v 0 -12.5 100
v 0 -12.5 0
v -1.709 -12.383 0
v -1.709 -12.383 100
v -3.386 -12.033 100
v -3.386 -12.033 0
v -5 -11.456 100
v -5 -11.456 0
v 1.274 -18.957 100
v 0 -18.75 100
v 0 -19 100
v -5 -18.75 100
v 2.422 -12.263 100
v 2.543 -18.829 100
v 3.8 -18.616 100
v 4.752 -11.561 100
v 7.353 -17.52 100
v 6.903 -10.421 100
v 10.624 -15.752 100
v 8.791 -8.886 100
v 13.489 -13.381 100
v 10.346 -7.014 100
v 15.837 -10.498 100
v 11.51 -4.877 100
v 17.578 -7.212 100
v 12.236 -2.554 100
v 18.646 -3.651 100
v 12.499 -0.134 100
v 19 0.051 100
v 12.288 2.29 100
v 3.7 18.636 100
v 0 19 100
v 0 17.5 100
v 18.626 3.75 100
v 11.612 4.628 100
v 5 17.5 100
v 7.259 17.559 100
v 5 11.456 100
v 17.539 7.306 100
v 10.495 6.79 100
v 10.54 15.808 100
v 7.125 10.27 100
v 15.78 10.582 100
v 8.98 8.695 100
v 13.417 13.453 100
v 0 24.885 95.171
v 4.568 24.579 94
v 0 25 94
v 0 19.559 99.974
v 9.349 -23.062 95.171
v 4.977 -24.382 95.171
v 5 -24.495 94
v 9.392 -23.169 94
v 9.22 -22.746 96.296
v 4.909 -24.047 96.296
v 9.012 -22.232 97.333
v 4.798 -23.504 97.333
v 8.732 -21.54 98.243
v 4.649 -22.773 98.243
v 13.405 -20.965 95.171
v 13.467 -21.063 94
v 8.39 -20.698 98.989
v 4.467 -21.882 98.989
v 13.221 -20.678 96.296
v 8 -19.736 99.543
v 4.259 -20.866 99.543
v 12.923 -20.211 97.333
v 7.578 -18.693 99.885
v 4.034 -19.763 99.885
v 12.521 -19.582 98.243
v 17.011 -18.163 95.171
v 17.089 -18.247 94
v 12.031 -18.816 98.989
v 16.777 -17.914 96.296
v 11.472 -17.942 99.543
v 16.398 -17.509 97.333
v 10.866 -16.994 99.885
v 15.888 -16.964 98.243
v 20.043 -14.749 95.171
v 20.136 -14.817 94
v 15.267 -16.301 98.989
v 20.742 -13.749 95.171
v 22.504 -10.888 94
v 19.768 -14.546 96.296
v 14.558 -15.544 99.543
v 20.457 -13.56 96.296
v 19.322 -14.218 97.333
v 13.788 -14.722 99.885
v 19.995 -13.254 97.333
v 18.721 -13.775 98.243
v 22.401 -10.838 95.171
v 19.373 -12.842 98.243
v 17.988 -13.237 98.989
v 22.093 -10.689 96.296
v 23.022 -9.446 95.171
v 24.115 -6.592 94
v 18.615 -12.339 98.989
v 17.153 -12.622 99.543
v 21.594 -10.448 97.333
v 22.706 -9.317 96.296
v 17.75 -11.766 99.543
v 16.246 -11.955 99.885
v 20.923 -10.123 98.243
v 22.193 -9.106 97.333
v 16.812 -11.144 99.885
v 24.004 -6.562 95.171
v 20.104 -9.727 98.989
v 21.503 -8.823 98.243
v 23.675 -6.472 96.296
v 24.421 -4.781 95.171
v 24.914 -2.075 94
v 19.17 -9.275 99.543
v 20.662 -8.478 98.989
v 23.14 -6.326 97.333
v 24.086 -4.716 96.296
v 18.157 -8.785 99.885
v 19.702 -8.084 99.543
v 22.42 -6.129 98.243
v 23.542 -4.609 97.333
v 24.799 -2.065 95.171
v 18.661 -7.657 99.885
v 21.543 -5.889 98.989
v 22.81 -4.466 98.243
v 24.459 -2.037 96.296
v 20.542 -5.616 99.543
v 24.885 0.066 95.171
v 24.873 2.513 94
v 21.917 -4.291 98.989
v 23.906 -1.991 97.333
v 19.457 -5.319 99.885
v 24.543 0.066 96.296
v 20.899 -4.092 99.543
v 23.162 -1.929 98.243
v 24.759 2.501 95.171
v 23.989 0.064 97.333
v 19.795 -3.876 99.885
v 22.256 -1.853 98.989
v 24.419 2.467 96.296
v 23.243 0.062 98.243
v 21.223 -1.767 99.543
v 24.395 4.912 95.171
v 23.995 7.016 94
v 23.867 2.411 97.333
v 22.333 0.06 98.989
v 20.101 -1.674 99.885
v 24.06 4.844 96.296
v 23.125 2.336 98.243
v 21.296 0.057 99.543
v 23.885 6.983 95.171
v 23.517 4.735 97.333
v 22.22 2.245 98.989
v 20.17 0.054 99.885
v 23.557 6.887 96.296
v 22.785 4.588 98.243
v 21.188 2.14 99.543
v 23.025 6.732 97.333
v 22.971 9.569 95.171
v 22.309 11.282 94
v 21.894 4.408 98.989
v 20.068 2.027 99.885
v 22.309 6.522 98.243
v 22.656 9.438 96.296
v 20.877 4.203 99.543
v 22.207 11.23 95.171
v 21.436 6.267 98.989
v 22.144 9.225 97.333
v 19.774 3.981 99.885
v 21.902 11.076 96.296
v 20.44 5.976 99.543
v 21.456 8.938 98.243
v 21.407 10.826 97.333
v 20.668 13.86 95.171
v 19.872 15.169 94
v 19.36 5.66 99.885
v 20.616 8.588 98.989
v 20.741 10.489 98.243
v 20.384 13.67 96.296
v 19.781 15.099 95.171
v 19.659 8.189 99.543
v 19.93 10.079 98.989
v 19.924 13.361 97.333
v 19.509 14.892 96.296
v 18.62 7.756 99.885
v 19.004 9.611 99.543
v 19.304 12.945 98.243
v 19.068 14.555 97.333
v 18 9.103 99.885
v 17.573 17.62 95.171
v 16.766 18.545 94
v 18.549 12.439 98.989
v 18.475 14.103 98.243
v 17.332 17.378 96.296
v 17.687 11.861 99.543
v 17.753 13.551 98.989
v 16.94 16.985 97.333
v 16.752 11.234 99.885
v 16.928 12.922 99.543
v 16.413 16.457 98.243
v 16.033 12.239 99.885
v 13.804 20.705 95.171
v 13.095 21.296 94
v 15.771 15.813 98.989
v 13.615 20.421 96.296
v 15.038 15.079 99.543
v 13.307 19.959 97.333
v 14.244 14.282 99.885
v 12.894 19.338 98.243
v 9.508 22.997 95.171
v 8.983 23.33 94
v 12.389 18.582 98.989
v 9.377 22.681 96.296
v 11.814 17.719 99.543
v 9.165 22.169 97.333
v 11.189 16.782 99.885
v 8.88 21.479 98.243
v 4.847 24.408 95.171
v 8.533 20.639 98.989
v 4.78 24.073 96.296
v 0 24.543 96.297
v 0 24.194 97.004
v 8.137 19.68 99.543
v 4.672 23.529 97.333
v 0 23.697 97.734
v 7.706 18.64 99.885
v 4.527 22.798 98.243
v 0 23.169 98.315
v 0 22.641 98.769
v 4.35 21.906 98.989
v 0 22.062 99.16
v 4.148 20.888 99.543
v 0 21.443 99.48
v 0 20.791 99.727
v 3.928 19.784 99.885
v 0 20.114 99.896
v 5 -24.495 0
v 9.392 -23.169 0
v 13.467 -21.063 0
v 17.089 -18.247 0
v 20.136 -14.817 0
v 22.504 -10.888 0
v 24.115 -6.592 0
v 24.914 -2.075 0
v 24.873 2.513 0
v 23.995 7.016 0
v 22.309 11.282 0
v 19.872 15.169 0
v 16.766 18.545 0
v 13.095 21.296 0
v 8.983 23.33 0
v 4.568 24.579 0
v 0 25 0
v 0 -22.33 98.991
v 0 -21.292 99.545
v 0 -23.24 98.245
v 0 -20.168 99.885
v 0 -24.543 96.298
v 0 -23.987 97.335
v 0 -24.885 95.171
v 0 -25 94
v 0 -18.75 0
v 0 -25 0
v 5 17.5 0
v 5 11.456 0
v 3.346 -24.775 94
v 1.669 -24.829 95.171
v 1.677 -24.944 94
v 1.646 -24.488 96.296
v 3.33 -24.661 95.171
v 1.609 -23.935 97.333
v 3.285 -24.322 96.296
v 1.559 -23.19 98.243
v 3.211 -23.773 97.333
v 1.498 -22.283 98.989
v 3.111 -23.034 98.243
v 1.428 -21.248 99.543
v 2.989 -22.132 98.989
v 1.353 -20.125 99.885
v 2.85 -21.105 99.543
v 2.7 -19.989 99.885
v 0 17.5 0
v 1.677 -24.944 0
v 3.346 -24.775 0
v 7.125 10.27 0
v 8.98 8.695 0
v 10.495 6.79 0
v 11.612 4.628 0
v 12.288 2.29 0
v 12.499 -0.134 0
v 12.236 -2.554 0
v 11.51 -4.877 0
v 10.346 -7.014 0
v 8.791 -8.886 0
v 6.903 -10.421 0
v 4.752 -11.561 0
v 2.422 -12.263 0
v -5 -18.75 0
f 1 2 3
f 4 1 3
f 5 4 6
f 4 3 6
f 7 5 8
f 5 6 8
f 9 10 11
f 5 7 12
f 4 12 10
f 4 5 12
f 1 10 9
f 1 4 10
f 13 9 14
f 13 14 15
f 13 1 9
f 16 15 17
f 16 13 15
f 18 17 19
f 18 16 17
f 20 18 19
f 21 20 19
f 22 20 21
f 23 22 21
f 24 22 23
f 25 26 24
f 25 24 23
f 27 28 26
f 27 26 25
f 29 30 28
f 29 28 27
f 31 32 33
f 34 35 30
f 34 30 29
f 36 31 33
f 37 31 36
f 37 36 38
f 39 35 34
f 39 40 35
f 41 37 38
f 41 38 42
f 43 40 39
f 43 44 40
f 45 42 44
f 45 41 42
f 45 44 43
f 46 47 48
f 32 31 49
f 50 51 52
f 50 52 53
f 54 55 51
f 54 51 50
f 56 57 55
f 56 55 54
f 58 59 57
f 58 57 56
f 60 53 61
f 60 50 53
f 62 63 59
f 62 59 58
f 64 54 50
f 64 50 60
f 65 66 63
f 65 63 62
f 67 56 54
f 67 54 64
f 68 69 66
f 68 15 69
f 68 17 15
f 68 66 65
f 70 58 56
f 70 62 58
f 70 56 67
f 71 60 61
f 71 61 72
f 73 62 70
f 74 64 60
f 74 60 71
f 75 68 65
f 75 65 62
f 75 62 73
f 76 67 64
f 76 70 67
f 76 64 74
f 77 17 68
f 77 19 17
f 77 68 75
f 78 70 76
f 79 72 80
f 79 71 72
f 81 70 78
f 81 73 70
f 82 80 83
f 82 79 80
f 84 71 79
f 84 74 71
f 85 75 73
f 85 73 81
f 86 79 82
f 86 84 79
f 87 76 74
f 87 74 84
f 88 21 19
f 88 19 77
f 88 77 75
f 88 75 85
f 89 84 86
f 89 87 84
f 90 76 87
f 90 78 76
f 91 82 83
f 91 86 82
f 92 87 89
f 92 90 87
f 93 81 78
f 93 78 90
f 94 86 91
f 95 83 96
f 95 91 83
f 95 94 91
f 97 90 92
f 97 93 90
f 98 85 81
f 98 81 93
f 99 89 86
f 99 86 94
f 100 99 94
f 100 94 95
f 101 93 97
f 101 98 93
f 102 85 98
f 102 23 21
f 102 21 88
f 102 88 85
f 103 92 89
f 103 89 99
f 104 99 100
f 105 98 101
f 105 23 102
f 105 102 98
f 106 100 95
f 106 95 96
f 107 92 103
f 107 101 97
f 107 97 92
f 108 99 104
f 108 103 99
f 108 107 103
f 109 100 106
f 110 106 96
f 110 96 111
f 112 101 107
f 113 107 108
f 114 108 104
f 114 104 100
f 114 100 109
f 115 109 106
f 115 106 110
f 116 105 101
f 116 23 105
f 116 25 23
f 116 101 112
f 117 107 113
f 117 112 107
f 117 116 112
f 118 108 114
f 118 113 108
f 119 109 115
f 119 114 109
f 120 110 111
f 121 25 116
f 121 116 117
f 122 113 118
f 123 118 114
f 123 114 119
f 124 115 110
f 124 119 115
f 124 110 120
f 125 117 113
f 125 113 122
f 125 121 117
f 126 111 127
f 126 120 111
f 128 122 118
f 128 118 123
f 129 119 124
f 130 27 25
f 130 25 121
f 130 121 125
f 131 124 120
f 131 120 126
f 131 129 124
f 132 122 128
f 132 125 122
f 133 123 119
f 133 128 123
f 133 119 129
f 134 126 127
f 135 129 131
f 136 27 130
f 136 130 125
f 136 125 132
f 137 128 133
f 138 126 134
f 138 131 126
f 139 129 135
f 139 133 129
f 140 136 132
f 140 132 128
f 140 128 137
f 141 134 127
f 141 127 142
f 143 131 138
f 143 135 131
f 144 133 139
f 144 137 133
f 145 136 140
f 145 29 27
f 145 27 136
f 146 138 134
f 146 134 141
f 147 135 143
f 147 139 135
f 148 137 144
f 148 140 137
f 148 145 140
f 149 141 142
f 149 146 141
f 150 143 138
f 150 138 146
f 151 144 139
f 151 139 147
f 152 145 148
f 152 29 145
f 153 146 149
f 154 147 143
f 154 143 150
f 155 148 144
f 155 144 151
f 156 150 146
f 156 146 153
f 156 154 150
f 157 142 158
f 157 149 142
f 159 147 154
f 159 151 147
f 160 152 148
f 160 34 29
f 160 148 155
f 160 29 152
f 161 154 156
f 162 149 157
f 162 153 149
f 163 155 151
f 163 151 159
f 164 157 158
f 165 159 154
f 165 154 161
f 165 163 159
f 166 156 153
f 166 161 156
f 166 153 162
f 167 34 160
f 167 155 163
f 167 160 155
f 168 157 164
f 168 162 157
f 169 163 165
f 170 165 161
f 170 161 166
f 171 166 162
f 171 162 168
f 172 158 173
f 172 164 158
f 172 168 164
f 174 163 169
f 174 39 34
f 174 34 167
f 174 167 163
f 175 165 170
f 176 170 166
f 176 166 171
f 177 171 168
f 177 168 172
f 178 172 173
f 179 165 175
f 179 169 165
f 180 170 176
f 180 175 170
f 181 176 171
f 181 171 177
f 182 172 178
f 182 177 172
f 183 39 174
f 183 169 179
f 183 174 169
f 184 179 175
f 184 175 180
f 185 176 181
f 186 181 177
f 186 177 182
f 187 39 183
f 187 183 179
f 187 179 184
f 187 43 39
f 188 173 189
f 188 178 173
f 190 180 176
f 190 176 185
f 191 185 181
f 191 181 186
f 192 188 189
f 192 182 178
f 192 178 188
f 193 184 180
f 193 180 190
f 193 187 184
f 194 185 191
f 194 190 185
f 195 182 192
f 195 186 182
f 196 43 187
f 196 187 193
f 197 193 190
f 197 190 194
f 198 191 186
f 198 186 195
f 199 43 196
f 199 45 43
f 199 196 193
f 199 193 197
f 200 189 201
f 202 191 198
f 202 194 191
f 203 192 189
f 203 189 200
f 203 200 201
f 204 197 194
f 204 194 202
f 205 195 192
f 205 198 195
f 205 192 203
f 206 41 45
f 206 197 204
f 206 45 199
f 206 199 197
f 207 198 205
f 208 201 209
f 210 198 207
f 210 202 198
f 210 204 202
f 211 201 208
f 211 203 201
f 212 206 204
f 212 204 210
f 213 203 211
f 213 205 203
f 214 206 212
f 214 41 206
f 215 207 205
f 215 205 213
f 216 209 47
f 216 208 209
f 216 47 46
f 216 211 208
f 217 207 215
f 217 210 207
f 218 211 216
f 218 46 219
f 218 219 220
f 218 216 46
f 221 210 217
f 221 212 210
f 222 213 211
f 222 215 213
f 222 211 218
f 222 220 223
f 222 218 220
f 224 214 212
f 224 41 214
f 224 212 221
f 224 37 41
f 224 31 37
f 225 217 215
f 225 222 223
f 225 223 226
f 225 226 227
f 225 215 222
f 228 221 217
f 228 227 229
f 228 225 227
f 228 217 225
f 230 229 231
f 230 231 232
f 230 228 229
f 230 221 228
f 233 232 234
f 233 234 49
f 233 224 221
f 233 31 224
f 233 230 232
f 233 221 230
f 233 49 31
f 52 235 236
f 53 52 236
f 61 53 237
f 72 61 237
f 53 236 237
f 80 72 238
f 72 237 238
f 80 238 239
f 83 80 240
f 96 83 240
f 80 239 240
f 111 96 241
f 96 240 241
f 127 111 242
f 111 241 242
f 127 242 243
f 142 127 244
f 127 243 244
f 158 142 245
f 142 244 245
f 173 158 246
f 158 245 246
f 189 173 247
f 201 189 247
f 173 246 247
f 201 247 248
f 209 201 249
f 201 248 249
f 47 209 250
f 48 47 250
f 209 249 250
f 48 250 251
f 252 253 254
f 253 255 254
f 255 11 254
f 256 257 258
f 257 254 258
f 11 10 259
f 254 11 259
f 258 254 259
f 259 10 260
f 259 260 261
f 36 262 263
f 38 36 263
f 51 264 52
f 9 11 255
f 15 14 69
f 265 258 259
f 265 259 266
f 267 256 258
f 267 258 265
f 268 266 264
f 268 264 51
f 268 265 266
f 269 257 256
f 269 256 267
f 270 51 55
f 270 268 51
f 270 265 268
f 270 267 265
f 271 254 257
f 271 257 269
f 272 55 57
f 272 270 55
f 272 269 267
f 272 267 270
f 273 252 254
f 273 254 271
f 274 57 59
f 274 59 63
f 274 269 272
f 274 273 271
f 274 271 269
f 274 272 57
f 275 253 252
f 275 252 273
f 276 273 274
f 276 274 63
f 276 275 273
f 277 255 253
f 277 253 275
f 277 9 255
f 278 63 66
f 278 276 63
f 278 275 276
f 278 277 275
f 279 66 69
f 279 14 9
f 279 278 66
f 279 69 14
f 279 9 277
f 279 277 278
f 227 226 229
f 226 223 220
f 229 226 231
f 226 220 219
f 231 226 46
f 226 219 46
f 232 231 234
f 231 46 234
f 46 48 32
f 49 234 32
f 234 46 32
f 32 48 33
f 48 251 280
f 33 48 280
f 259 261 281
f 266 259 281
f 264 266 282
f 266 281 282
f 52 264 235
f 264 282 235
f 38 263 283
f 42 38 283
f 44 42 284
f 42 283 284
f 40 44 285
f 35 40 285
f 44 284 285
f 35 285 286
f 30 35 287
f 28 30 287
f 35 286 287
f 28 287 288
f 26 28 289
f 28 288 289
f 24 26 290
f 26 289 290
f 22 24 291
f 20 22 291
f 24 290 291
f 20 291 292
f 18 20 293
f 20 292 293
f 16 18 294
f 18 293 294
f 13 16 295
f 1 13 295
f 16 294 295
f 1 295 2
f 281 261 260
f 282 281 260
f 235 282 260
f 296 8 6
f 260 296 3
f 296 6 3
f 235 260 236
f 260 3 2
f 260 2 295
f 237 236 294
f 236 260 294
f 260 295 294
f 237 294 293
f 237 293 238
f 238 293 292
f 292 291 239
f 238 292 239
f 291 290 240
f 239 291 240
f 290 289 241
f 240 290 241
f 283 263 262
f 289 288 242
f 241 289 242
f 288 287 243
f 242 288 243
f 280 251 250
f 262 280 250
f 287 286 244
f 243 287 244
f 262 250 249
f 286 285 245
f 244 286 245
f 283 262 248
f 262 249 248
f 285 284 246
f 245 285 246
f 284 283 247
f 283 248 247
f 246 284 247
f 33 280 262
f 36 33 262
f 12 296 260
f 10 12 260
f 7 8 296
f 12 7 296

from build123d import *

# Parameters (mm, degrees)
F1_DEPTH = 100
F2_R     = 6


with BuildPart() as f1:
    # F0 (on Top) → F1 (new body)
    with BuildSketch(Plane.XY):
        with BuildLine():
            ThreePointArc((5, 11.456439), (12.236329, -2.553871), (0, -12.5))
            ThreePointArc((0, -12.5), (-2.553871, -12.236329), (-5, -11.456439))
            Line((-5, -11.456439), (-5, -18.75))
            Line((-5, -18.75), (0, -18.75))
            Line((0, -18.75), (0, -25))
            ThreePointArc((0, -25), (2.512724, -24.873404), (5, -24.494897))
            ThreePointArc((5, -24.494897), (24.873404, 2.512724), (0, 25))
            Line((0, 25), (0, 17.5))
            Line((0, 17.5), (5, 17.5))
            Line((5, 17.5), (5, 11.456439))
        make_face()
    extrude(amount=F1_DEPTH)

    # F2
    f2_edges = [f1.edges().sort_by_distance(p)[0] for p in [
        (25, 0, 100),
    ]]
    fillet(f2_edges, radius=F2_R)


solid = f1.part
